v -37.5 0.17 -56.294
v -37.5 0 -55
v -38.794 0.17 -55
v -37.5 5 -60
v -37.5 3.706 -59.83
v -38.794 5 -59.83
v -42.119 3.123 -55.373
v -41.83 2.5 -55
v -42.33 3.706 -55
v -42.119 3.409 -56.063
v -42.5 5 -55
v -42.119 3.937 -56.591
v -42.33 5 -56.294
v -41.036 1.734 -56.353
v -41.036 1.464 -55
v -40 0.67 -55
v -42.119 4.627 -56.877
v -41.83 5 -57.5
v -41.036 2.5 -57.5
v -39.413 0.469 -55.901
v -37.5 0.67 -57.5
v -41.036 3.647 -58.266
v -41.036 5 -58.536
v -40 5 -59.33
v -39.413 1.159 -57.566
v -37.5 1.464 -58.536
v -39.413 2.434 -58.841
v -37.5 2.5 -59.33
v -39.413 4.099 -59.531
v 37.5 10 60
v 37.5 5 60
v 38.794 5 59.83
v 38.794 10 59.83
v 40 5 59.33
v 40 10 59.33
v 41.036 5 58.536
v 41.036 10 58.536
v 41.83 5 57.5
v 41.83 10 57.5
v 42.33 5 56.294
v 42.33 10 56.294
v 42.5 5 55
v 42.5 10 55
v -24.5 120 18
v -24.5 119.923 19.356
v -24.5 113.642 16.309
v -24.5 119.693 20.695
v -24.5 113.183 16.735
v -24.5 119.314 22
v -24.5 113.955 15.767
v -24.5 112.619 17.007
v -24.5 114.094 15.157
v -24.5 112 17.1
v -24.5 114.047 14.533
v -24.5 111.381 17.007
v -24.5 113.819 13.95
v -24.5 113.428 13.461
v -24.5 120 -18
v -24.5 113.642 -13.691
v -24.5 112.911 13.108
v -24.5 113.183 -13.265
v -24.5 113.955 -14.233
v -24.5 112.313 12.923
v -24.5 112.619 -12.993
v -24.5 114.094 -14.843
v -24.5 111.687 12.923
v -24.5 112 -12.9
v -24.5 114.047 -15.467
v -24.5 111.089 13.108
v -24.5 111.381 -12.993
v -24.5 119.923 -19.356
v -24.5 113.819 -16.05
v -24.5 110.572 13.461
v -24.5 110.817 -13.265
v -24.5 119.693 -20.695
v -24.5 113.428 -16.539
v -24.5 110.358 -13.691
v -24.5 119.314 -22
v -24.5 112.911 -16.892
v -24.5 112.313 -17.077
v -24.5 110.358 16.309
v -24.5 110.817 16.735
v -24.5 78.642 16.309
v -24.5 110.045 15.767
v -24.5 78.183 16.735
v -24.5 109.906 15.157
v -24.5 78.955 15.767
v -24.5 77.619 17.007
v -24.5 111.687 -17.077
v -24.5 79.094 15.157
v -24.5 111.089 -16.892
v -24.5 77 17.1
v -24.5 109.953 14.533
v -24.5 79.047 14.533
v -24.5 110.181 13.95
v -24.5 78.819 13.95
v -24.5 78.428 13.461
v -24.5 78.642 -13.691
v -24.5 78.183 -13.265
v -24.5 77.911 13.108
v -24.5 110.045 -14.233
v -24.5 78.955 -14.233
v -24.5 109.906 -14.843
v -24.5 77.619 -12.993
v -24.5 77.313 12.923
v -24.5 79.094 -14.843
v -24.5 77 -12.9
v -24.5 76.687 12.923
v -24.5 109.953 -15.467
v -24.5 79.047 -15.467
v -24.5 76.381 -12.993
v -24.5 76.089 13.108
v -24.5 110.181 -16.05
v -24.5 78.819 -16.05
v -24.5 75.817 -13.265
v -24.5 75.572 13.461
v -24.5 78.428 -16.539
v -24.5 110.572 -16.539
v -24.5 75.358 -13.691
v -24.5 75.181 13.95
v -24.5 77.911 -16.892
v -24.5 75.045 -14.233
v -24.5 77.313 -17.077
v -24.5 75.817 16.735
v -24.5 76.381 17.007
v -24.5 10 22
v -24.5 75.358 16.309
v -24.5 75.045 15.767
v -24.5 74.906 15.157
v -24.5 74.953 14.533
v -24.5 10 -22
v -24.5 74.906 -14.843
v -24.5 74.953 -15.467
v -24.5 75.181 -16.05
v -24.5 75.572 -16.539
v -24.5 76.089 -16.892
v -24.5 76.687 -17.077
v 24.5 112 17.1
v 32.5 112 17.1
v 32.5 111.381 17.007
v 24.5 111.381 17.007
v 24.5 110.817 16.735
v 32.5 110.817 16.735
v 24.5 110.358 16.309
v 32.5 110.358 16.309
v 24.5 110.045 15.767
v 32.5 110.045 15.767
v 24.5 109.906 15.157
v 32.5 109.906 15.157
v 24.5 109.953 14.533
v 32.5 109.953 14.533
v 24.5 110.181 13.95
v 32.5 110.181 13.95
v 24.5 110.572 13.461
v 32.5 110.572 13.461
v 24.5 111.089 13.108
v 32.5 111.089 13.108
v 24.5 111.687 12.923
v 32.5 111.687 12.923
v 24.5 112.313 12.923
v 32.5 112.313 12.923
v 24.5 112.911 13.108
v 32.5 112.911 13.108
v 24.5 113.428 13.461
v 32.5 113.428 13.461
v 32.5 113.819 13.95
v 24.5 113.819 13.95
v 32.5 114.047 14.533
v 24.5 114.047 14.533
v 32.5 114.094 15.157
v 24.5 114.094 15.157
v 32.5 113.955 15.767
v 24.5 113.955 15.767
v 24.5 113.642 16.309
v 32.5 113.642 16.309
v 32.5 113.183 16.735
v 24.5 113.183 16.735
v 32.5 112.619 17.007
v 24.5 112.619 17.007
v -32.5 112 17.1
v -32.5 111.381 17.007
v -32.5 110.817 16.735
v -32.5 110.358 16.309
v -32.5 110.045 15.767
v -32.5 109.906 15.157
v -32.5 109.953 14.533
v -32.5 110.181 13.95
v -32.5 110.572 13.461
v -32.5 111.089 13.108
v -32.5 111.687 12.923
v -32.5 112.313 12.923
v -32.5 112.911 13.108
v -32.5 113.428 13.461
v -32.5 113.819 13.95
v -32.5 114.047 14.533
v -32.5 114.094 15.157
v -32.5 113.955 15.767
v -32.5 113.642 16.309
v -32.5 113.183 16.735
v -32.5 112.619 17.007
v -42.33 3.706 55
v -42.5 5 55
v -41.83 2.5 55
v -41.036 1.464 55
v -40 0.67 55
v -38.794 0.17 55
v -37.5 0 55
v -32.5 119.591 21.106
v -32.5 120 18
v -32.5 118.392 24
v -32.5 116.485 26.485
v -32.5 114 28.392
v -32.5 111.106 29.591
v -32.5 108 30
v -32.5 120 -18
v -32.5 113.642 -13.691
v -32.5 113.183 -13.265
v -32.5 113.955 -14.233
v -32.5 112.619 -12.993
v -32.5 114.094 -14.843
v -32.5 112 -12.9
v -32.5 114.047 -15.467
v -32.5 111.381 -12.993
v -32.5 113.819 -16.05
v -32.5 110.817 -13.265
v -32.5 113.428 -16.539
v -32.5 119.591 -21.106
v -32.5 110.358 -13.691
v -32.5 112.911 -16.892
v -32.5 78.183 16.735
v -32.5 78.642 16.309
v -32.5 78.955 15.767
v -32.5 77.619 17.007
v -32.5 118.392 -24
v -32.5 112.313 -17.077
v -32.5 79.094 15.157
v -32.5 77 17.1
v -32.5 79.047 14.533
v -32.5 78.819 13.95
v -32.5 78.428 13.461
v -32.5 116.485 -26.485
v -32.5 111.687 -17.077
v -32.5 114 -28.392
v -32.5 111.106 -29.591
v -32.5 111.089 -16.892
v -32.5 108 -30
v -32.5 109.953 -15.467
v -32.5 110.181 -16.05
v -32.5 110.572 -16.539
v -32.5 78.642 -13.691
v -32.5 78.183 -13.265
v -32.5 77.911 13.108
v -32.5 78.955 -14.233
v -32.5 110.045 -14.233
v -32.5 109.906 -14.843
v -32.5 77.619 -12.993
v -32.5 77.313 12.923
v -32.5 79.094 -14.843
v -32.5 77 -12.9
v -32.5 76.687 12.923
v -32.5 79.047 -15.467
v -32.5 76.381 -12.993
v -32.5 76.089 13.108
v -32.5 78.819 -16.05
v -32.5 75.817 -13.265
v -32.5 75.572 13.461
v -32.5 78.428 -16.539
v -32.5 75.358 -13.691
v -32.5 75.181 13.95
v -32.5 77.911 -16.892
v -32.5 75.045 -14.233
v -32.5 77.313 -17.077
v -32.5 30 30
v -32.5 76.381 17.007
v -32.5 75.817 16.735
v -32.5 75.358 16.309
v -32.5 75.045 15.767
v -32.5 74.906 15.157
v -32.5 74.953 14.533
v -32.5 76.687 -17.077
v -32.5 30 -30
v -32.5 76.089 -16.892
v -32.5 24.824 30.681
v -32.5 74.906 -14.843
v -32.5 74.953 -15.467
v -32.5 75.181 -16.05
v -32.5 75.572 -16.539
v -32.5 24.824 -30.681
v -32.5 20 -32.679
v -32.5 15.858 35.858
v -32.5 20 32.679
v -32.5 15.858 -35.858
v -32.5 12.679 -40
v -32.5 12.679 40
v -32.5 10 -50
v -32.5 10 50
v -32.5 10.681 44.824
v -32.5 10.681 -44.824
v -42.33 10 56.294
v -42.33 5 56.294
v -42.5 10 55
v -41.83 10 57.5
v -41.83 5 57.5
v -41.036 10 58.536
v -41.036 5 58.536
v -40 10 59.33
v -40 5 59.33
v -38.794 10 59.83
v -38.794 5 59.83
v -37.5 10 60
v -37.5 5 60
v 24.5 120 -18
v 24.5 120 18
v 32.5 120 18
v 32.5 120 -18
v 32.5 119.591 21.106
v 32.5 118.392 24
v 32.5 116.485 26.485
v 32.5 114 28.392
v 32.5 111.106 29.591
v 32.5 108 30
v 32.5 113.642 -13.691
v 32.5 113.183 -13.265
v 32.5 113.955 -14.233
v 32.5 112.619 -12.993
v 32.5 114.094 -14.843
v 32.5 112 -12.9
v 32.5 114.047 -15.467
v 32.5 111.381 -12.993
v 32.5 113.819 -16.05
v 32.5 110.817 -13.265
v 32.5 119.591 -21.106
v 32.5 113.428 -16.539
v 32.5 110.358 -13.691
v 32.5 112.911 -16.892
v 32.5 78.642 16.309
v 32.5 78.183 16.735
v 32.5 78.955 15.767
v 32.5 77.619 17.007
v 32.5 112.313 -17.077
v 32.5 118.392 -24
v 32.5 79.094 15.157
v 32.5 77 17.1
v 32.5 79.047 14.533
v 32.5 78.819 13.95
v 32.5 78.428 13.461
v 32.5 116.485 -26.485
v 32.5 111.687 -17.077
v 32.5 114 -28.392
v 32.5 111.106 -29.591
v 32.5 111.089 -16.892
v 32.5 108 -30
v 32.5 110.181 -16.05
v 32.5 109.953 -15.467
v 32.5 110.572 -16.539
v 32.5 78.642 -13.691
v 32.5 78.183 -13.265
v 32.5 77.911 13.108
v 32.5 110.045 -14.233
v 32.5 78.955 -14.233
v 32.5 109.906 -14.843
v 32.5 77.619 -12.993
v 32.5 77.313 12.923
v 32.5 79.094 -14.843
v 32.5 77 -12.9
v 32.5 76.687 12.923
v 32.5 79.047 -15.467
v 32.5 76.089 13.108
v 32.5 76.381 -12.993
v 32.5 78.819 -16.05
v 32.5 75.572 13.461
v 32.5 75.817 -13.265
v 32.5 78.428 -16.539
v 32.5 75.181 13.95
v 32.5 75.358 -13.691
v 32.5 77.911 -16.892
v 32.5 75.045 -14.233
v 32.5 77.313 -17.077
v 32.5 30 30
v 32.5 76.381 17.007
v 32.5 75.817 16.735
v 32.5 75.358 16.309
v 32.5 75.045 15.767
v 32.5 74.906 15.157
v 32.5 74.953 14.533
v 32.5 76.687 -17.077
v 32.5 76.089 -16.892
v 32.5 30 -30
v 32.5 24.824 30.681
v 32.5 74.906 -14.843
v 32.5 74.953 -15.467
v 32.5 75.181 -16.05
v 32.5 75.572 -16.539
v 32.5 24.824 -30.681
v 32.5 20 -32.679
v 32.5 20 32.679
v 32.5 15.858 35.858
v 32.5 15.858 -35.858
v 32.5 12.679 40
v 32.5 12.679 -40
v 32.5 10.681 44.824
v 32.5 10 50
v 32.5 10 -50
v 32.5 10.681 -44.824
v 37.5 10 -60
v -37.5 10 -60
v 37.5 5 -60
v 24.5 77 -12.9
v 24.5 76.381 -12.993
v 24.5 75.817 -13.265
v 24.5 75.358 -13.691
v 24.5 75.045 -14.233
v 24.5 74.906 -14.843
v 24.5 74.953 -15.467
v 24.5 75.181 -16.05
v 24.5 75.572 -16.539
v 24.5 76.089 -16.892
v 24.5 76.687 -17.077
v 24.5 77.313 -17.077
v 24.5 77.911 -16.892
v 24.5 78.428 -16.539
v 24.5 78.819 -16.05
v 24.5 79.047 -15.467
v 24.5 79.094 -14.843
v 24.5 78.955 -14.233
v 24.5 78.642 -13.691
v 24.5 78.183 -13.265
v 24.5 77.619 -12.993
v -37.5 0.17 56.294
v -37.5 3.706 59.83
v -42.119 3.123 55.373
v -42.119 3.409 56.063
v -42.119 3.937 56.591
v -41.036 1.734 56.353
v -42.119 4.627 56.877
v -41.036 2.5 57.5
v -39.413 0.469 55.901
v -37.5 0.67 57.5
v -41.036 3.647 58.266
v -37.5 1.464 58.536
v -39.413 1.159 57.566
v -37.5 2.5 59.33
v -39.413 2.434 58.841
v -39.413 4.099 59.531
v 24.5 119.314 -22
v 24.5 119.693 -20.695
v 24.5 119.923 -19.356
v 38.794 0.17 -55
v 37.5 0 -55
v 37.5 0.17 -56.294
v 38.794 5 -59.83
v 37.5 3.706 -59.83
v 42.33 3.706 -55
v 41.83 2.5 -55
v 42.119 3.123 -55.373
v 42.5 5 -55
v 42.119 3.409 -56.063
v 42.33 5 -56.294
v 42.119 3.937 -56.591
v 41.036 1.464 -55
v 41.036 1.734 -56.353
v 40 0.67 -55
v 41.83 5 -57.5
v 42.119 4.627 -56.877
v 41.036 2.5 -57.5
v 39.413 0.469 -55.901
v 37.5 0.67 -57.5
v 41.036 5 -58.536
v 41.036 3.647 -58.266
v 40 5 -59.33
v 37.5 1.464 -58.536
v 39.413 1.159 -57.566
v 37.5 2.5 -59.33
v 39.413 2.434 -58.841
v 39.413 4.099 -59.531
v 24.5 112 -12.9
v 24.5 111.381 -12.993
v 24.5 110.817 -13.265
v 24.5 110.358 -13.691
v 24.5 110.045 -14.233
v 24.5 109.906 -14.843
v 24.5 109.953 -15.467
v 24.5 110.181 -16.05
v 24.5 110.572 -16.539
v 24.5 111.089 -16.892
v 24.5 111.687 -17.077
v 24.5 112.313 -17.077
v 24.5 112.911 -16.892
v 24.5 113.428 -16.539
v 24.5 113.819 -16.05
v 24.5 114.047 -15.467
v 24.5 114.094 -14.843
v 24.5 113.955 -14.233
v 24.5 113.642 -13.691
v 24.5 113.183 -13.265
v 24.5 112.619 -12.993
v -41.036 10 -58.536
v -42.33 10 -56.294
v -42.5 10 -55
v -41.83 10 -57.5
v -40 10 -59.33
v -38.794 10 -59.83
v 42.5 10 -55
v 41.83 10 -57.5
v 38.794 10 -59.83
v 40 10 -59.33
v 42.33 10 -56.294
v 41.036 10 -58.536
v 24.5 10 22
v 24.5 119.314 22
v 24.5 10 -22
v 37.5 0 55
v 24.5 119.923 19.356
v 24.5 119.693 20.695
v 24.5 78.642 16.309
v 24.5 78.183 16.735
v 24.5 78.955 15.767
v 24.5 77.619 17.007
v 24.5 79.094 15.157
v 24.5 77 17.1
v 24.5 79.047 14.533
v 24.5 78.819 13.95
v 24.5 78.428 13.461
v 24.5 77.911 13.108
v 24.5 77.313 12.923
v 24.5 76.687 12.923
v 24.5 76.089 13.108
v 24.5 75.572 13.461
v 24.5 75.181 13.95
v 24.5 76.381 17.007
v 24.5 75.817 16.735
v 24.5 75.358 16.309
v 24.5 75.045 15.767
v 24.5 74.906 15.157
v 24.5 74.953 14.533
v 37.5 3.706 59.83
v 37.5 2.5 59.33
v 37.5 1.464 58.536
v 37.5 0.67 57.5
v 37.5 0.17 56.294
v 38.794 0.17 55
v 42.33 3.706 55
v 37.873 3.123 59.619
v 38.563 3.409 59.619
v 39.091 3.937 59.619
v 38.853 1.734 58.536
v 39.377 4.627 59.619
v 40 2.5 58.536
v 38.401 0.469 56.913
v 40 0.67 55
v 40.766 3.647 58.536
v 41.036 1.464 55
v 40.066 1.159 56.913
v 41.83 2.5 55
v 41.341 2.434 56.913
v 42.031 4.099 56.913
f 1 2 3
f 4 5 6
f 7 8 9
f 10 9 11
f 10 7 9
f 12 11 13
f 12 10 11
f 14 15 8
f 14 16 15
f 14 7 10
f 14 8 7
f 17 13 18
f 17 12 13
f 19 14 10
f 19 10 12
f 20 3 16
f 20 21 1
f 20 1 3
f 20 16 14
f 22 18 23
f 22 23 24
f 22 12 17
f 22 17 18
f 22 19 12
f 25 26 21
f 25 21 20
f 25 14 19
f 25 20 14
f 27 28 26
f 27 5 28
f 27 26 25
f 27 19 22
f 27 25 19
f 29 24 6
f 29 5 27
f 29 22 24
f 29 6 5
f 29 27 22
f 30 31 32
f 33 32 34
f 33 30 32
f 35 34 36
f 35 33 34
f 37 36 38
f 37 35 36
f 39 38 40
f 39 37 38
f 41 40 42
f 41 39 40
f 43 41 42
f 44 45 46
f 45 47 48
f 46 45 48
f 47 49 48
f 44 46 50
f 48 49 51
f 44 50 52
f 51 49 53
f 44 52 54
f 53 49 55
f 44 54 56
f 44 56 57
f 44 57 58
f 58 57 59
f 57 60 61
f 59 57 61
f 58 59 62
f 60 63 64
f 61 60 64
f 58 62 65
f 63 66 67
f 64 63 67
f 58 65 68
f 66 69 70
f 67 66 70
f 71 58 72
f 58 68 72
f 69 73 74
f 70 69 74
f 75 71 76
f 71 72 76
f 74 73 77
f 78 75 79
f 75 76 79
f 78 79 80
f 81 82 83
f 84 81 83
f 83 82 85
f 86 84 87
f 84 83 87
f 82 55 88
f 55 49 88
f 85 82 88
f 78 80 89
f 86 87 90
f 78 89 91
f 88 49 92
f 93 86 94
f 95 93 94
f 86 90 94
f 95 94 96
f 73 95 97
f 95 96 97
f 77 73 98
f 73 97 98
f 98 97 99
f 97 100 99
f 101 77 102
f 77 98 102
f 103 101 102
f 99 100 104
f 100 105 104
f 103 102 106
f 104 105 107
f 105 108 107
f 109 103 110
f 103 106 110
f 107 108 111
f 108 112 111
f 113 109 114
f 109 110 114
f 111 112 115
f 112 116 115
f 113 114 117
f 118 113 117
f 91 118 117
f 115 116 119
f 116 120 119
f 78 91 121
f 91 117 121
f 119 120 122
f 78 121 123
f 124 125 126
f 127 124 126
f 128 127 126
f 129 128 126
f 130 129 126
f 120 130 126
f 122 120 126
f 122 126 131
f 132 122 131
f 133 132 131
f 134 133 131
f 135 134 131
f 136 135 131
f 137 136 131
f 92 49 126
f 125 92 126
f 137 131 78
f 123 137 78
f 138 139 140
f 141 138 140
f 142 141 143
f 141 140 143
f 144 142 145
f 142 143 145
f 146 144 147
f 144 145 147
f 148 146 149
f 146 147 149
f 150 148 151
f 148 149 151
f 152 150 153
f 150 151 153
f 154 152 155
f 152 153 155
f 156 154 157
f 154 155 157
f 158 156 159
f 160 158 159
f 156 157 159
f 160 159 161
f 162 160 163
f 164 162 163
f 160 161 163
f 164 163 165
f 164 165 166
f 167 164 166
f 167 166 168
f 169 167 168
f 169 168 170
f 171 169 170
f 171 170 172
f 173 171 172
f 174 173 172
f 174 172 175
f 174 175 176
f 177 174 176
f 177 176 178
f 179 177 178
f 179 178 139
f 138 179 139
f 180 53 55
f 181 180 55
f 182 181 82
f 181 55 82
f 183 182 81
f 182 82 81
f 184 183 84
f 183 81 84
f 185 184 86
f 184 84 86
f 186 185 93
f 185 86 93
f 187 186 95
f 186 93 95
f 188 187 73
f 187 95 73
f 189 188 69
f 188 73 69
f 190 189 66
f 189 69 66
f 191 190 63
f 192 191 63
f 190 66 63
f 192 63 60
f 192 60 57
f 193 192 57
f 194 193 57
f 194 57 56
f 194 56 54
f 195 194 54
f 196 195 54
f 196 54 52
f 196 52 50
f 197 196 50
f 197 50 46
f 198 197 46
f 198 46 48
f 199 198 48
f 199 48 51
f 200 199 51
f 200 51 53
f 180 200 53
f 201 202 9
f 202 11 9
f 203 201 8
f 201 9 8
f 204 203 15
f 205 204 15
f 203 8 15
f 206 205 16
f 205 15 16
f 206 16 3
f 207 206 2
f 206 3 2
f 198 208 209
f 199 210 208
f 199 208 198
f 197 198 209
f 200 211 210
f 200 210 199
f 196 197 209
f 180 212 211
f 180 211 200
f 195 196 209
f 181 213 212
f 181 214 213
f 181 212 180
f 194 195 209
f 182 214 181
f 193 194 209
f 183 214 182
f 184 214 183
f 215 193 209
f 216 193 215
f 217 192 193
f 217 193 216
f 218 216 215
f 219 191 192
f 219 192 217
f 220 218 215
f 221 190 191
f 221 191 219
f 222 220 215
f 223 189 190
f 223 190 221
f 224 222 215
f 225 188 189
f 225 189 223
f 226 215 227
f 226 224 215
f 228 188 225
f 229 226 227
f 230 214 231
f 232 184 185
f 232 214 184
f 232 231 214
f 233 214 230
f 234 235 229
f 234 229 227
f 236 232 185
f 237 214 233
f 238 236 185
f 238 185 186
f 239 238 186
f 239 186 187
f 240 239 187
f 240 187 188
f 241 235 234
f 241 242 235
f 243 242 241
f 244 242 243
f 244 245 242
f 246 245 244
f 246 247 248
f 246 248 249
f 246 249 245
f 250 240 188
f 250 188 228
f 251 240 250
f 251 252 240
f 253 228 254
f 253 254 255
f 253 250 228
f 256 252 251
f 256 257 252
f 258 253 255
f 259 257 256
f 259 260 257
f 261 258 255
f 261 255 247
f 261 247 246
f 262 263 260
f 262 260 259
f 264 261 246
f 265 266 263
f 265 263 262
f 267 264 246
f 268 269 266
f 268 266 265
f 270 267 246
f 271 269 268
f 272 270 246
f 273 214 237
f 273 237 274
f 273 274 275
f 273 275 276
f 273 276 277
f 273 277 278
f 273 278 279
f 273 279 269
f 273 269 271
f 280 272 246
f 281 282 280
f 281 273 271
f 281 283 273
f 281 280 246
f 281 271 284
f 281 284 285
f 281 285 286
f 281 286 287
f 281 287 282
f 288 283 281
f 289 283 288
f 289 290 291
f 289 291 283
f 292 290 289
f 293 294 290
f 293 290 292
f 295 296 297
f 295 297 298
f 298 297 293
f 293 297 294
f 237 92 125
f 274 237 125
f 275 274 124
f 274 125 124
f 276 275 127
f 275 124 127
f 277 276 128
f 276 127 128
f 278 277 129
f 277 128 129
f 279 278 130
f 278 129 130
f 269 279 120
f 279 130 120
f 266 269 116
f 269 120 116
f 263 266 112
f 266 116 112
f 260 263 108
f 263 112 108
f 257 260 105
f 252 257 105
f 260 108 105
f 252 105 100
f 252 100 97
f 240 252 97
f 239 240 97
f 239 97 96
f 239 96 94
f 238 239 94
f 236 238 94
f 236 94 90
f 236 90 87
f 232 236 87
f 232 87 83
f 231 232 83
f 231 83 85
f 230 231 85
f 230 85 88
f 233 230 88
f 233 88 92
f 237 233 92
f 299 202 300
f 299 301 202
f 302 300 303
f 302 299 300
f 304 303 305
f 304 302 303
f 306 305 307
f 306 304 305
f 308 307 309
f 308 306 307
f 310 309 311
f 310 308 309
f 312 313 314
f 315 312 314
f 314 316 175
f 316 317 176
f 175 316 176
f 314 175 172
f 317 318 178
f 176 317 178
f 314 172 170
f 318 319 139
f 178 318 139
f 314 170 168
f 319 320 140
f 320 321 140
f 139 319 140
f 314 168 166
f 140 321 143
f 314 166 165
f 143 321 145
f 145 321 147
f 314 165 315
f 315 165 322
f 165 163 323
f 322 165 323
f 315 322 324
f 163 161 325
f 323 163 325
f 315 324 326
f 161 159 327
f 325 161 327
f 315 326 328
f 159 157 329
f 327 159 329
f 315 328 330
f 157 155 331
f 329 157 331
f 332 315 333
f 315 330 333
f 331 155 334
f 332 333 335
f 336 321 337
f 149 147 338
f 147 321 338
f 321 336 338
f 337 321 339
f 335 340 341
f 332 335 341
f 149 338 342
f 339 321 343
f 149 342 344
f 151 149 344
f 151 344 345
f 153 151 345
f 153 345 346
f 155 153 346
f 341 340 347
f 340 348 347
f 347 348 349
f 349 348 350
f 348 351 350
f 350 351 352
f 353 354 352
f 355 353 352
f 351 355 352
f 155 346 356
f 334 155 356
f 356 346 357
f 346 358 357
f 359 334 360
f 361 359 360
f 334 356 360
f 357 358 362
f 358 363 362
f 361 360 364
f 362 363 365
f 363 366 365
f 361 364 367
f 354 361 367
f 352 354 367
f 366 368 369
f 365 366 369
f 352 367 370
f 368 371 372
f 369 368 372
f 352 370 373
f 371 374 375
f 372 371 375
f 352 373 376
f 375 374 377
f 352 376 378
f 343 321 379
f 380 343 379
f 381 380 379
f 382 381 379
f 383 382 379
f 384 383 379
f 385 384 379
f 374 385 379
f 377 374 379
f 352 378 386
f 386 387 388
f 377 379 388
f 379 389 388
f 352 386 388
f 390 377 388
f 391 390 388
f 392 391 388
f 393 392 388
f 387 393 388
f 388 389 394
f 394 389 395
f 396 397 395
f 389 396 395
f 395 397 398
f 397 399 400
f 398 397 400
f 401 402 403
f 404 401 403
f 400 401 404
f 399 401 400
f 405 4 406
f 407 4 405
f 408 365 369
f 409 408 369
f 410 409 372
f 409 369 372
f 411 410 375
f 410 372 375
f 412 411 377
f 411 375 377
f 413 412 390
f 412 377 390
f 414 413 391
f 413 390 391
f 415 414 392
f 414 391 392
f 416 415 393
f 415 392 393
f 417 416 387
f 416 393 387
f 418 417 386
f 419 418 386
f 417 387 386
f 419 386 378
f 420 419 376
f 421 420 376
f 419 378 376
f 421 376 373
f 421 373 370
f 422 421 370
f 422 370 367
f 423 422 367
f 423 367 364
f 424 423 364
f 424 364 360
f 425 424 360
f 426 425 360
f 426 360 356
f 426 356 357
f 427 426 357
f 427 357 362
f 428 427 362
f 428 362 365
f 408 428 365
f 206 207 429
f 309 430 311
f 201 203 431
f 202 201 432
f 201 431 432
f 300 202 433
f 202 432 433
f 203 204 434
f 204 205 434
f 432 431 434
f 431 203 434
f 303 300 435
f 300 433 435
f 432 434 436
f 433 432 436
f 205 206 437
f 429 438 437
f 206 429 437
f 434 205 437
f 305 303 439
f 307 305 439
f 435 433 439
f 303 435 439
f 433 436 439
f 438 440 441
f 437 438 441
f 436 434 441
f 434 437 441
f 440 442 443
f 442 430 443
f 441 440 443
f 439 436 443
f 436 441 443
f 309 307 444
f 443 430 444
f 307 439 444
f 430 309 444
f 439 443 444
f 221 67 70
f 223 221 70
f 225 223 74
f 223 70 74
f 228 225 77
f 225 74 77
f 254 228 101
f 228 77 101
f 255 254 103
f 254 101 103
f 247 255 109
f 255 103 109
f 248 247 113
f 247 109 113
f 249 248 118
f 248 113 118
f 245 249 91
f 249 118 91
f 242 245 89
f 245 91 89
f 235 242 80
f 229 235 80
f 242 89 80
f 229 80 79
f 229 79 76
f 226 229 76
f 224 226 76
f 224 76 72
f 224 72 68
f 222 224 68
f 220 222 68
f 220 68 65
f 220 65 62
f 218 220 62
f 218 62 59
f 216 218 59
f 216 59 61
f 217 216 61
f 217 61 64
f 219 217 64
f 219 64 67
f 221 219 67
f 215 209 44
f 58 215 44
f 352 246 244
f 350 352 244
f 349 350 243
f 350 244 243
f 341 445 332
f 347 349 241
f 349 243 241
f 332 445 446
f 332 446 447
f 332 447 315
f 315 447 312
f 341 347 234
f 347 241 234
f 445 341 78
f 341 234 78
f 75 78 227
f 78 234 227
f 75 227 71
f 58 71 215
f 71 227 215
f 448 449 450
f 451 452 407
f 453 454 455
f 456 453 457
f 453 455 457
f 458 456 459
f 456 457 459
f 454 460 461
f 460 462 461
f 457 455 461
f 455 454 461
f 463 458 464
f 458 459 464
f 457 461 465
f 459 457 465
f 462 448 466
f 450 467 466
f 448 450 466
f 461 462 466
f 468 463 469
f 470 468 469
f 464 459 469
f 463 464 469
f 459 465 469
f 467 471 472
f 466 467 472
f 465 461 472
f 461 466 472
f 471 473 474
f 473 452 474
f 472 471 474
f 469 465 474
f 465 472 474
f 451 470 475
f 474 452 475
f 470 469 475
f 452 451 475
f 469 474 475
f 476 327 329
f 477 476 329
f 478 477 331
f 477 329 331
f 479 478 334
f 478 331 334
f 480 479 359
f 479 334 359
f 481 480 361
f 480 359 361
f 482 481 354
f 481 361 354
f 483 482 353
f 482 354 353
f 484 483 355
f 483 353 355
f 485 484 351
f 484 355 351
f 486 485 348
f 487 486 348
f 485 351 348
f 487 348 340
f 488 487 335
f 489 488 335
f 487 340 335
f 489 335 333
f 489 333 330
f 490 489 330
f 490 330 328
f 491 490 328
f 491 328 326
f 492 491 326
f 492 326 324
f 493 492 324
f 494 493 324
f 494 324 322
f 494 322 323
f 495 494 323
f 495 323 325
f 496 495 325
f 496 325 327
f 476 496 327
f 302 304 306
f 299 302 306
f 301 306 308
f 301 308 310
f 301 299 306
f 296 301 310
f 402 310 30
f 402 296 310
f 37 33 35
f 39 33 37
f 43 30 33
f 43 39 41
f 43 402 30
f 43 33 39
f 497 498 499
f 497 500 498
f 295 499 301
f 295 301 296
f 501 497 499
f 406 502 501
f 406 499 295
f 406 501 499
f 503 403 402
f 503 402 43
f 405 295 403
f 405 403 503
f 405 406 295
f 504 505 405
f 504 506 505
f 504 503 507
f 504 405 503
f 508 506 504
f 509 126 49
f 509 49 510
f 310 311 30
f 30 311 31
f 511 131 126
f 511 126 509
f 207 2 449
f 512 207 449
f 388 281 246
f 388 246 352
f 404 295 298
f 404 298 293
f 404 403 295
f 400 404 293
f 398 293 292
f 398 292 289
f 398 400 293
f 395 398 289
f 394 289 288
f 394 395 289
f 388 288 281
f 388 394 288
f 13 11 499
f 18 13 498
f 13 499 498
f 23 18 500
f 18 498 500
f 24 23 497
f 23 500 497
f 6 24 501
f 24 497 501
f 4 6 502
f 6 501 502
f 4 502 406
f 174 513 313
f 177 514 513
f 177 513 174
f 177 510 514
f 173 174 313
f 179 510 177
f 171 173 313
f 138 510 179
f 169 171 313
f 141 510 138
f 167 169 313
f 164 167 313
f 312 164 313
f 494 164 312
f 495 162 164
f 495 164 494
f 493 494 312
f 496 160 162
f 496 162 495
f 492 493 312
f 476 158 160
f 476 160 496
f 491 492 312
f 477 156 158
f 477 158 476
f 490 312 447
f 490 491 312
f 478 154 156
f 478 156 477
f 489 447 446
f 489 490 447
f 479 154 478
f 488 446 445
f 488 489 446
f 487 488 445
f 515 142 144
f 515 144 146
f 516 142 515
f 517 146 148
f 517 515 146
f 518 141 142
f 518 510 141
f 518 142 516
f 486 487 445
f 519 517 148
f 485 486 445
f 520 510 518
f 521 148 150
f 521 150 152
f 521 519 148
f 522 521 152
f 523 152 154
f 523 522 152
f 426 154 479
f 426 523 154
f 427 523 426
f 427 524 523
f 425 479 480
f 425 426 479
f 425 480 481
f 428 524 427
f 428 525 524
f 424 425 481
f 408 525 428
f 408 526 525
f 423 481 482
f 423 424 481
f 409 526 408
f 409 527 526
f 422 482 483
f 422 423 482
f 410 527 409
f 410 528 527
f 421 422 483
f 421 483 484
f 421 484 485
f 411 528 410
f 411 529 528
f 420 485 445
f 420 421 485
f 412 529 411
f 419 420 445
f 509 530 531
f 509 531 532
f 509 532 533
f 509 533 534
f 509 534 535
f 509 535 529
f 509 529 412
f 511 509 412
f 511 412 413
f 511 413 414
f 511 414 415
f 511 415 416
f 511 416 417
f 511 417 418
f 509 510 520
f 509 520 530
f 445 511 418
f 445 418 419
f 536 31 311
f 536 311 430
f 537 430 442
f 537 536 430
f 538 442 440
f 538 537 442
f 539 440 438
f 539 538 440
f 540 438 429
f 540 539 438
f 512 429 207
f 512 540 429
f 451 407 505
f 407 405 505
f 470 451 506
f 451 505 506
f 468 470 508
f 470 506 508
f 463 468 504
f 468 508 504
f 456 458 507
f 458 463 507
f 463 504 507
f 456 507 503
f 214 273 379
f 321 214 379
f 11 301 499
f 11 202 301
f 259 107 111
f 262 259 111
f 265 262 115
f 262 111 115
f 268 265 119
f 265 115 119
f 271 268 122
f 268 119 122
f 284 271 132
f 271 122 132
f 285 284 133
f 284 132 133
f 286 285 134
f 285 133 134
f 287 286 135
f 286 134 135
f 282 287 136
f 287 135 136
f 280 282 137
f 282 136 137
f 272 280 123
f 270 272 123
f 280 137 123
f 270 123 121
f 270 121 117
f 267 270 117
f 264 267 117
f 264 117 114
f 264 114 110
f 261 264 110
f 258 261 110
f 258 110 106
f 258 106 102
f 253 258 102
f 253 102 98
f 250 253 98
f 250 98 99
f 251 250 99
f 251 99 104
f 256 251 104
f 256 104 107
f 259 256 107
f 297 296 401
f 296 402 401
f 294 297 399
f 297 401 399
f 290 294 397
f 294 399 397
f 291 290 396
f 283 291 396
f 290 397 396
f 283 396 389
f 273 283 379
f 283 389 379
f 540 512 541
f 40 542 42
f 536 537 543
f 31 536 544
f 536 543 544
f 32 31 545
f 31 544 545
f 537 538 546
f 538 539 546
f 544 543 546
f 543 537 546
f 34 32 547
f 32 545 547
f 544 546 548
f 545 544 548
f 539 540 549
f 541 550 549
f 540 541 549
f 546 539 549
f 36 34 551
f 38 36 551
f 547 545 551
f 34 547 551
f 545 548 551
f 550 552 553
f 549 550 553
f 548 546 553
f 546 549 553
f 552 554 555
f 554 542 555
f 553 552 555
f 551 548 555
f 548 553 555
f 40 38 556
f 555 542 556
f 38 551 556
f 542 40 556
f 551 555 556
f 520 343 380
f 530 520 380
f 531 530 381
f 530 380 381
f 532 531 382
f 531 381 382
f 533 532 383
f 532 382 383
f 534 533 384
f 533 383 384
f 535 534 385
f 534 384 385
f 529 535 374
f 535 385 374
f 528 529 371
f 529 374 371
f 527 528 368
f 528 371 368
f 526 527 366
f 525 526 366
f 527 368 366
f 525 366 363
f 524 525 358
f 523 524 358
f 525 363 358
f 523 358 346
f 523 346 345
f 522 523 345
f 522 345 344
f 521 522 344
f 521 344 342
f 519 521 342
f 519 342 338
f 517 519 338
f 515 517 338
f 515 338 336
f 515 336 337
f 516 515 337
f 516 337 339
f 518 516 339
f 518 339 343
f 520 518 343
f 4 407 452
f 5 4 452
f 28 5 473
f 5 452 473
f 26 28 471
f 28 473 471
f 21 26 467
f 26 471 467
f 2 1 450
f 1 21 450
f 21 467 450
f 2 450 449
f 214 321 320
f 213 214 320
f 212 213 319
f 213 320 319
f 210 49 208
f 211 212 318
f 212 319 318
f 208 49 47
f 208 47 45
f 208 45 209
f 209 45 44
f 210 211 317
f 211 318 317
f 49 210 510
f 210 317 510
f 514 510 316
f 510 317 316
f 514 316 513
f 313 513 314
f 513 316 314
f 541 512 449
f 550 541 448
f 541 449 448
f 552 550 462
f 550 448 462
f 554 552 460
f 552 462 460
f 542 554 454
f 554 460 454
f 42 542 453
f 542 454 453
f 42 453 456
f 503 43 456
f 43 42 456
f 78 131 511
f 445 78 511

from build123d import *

# Parameters (mm, degrees)
SKETCH_1_W          = 85
SKETCH_1_H          = 120
EXTRUDE_1_DEPTH     = 10
SKETCH_2_W          = 65
SKETCH_2_H          = 60
SKETCH_2_W_2        = 49
SKETCH_2_H_2        = 44
EXTRUDE_2_DEPTH     = 110
FILLET_1_R          = 5
FILLET_2_R          = 12
SKETCH_3_R          = 2.1
CUT_EXTRUDE_1_DEPTH = 159.823801743
FILLET_3_R          = 20


with BuildPart() as part:
    # 草图1 → 凸台-拉伸1 (new body)
    with BuildSketch(Plane(origin=(0, 0, 0), x_dir=(1, 0, 0), z_dir=(0, 1, 0))):
        Rectangle(SKETCH_1_W, SKETCH_1_H)
    extrude(amount=EXTRUDE_1_DEPTH)

    # 草图2 → 凸台-拉伸2 (add)
    with BuildSketch(Plane(origin=(0, 10, 0), x_dir=(1, 0, 0), z_dir=(0, 1, 0))):
        Rectangle(SKETCH_2_W, SKETCH_2_H)
        Rectangle(SKETCH_2_W_2, SKETCH_2_H_2, mode=Mode.SUBTRACT)
    extrude(amount=EXTRUDE_2_DEPTH)

    # 圆角1
    fillet_1_edges = [part.edges().sort_by_distance(p)[0] for p in [
        (0, 0, -60),
        (42.5, 0, 0),
        (0, 0, 60),
        (-42.5, 0, 0),
        (-42.5, 5, -60),
        (42.5, 5, -60),
        (42.5, 5, 60),
        (-42.5, 5, 60),
    ]]
    fillet(fillet_1_edges, radius=FILLET_1_R)

    # 圆角2
    # the kernel refuses this fillet: 12 mm, written as the material it takes off along each edge
    with BuildSketch(Plane(origin=(62.5, 120, 30), x_dir=(0, -1, 0), z_dir=(-1, 0, 0)), Plane(origin=(-62.5, 120, -30), x_dir=(0, -1, 0), z_dir=(1, 0, 0))) as fillet_2_piece_1:
        with BuildLine():
            CenterArc((FILLET_2_R, -FILLET_2_R), FILLET_2_R, 90, 90)
            Line((0, -FILLET_2_R), (0, 0))
            Line((0, 0), (FILLET_2_R, 0))
        make_face()
    extrude(amount=125, mode=Mode.SUBTRACT)

    # 草图3 → 切除-拉伸1 (cut, through all)
    with BuildSketch(Plane(origin=(42.5, 0, 0), x_dir=(0, 0, -1), z_dir=(1, 0, 0))):
        with Locations(Location((-15, 112, 0), (0, 0, 180))):
            Circle(SKETCH_3_R)
        with Locations(Location((15, 112, 0), (0, 0, 180))):
            Circle(SKETCH_3_R)
        with Locations(Location((15, 77, 0), (0, 0, 180))):
            Circle(SKETCH_3_R)
        with Locations(Location((-15, 77, 0), (0, 0, 180))):
            Circle(SKETCH_3_R)
    extrude(amount=-CUT_EXTRUDE_1_DEPTH, mode=Mode.SUBTRACT)

    # 圆角3
    fillet_3_edges = [part.edges().sort_by_distance(p)[0] for p in [
        (0, 10, 30),
        (0, 10, -30),
    ]]
    fillet(fillet_3_edges, radius=FILLET_3_R)


solid = part.part
